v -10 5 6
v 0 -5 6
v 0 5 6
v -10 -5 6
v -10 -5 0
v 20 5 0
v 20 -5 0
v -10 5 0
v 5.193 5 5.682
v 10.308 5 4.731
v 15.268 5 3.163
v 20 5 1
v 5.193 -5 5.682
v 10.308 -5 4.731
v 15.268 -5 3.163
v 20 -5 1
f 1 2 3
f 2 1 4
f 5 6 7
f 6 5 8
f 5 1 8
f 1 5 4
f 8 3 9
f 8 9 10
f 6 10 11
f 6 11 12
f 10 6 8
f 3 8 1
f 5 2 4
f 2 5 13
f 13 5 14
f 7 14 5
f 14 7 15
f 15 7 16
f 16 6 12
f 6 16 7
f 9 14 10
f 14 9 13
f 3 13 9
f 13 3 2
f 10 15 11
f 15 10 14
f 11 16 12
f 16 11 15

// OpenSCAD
union() {
  translate([-10,-5,0]) cube([10,10,6],center=false);
  
  pts = [[20,0],[-1,0],[0,6]];

  h = 5;
  hrp = sqrt(400+h*h);
  angarc = 180-acos(h/hrp)*2;
  r = (hrp/2)/(h/hrp);
  dec = 4;
  arc = [for (i=[1:dec]) let (ta = 90-(angarc/dec)*i) [cos(ta)*r,sin(ta)*r-(r-6)]];
  
  translate([0,5,0]) rotate([90,0,0])
    linear_extrude(height=10) polygon(concat(pts,arc));
}
